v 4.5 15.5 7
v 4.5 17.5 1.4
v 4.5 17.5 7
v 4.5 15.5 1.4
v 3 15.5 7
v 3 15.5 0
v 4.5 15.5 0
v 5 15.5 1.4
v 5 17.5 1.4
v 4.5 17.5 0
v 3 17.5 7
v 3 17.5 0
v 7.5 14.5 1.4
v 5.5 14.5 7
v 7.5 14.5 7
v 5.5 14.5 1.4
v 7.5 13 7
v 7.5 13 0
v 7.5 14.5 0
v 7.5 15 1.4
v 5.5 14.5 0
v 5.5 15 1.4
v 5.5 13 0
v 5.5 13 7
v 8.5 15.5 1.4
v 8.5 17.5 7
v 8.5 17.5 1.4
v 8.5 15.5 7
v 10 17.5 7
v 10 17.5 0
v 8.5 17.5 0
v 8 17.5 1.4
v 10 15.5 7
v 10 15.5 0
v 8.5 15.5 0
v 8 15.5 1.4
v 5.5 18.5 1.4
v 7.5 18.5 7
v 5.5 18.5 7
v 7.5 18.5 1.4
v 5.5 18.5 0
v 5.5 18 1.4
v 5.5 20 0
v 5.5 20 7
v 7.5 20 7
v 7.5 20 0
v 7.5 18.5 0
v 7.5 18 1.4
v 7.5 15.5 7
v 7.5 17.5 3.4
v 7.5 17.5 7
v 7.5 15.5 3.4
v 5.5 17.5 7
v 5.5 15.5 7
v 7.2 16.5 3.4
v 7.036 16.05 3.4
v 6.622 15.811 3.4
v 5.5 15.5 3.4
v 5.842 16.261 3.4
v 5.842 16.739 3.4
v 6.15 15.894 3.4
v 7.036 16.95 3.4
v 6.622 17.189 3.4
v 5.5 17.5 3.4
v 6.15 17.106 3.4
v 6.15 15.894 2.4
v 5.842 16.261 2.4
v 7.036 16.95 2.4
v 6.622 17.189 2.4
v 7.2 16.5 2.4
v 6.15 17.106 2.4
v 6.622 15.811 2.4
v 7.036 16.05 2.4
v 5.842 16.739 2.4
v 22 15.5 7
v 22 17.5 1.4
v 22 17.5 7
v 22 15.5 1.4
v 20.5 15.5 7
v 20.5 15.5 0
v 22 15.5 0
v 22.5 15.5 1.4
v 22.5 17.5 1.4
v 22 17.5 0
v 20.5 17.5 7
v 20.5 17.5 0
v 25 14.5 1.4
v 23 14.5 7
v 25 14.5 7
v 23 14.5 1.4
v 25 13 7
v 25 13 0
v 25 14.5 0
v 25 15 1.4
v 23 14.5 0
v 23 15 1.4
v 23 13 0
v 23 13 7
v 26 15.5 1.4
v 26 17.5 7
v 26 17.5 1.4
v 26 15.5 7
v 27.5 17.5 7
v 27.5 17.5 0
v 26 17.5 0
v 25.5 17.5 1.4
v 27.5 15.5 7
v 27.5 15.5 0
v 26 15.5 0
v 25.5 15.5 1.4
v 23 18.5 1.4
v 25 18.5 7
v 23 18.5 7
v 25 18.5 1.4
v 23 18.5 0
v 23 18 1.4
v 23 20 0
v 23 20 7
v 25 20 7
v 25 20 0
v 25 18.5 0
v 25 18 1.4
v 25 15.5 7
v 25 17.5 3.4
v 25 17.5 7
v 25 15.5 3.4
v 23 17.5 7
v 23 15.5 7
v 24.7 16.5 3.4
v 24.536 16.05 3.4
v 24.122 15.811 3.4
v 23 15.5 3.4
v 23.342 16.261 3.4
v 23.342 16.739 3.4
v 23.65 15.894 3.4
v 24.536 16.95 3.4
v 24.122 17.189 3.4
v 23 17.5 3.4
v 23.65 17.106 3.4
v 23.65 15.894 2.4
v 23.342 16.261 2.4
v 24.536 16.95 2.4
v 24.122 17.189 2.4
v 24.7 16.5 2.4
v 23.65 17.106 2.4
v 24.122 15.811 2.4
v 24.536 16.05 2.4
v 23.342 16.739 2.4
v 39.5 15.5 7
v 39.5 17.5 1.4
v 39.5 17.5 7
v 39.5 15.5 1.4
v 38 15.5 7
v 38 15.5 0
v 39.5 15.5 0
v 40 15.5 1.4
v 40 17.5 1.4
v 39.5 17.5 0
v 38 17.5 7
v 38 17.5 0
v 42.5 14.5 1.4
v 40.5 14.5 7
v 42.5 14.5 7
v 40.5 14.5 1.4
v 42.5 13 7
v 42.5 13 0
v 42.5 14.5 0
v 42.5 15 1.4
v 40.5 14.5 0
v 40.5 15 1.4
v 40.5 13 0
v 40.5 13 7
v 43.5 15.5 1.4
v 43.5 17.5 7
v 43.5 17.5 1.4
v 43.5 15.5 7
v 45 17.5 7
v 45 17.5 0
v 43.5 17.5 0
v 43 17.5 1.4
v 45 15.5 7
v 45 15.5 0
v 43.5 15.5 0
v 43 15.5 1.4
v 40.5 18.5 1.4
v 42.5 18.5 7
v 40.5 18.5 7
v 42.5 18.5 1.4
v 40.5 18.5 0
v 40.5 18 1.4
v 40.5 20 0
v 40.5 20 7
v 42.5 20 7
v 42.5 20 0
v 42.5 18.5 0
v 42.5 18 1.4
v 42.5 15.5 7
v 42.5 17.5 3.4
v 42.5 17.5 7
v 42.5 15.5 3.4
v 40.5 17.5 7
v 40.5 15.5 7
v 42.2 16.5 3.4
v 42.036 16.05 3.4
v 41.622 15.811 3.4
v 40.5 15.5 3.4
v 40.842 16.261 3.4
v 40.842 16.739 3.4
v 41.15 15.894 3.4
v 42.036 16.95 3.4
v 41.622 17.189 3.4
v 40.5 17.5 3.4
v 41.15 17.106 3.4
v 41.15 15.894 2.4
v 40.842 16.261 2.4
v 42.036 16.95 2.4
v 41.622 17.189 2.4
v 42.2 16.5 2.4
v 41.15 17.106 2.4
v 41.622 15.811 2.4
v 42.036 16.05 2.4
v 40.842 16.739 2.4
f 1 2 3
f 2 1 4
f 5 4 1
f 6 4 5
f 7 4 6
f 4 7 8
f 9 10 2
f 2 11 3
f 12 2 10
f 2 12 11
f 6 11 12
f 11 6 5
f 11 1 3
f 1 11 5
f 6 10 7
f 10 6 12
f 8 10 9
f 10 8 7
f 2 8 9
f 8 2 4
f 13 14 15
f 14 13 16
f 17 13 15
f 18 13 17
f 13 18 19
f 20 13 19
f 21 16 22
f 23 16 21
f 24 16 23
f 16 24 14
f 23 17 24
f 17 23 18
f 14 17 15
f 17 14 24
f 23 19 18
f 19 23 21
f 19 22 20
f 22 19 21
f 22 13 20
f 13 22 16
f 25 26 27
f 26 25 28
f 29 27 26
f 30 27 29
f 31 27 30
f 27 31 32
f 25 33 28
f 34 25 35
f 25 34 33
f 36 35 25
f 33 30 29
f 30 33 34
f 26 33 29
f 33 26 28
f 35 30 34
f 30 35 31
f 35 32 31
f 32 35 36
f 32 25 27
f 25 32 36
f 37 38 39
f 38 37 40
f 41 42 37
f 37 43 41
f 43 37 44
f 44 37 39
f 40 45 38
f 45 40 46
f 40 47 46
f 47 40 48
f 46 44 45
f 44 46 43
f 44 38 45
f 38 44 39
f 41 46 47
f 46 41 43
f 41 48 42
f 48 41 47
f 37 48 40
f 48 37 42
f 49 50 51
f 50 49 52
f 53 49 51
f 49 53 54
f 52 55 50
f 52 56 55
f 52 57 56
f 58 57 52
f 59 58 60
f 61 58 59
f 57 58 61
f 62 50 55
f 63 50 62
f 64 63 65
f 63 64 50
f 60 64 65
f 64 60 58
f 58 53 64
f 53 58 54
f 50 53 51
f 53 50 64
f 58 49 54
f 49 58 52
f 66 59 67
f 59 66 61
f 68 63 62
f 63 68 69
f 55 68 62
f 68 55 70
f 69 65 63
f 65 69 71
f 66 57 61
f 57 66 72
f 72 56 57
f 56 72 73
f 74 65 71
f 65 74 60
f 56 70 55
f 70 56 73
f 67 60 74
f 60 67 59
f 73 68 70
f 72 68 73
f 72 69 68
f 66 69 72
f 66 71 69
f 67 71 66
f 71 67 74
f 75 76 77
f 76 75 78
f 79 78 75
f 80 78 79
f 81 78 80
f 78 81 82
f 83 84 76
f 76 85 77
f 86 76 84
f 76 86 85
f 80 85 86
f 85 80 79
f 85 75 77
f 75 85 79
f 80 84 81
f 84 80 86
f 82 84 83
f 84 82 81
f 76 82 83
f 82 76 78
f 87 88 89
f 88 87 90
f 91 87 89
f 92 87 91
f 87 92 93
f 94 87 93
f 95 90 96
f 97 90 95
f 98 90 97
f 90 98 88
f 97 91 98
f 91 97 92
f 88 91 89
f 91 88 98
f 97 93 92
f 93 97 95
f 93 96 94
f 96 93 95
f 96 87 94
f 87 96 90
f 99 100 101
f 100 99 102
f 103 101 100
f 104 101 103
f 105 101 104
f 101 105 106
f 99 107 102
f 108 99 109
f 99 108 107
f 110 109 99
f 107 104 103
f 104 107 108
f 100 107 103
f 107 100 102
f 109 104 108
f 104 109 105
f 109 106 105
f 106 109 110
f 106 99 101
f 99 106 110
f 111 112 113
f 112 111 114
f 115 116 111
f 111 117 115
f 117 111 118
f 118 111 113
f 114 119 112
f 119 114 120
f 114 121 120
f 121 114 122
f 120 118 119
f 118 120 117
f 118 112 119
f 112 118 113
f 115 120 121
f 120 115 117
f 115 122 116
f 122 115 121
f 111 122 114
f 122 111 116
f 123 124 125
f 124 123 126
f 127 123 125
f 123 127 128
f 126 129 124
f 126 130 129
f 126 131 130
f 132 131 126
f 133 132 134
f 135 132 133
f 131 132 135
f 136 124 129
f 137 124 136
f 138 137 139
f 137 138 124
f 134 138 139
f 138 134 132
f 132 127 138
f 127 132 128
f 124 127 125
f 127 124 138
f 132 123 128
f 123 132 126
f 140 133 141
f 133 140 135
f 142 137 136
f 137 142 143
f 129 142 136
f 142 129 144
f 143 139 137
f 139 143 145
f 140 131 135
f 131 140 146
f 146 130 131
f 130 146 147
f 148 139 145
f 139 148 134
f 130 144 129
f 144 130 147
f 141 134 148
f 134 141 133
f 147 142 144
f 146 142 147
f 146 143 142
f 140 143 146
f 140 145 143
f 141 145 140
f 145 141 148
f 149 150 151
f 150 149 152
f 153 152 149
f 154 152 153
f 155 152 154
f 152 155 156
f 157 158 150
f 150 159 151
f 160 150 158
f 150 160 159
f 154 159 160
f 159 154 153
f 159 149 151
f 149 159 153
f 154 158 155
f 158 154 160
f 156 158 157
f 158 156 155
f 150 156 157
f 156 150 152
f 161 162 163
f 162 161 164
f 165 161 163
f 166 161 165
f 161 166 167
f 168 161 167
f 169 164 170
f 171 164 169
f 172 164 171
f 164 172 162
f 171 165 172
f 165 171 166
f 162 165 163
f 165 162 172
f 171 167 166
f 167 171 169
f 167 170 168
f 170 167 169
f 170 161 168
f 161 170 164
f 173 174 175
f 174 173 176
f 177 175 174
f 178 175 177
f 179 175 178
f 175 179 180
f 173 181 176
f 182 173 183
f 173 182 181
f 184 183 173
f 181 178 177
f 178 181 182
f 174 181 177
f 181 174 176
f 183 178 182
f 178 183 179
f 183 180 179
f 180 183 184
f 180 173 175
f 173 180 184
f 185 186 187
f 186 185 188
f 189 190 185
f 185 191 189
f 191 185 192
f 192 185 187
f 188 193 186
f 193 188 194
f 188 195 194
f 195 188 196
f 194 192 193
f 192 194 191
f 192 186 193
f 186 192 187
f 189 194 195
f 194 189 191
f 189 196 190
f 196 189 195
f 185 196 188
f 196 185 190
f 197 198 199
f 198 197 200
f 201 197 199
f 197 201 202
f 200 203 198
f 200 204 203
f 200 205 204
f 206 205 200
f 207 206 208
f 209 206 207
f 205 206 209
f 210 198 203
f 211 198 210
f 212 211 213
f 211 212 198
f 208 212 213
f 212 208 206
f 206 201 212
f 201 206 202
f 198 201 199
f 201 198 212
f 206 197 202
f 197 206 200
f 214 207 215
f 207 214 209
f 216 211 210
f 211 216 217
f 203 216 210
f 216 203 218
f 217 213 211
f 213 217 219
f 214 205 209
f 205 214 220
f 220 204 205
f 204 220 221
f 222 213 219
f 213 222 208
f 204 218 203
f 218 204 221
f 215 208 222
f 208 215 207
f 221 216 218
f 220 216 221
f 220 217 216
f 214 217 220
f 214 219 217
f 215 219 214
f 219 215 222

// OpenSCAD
// file: button_clips.scad
$fs=0.5;

color("darkorange",0.5) button_dock();
color("springgreen") button_clips();
color("red",0.5) button_clip_cavity();

//dock measurements
top_height = 1.8;
shaft_height = 1.4;
dock_height = top_height + shaft_height;
hole_radius = 0.8;
hole_depth = 1;
base_radius = 3.5;
module button_dock(){
	difference(){
		union(){
			translate([-2,-2,shaft_height])
				cube([4,4,top_height]);
			translate([-1.5,-1.5,0])
				cube([3,3,dock_height]);
			translate([0,0,-2])
				cylinder(h=2, r=base_radius);
		}
		translate([0,0,dock_height-hole_depth+0.1]) 
			cylinder(h=hole_depth, r=hole_radius);
	}
}

clip_width = 2;
clip_thick = 1.5;
clip_height = 7;
module button_clip(){
	translate([-(2+clip_thick),clip_width/2,0])
	rotate([90,0,0])
	union(){
		cube([clip_thick ,clip_height, clip_width]);
		linear_extrude(height=clip_width)
		polygon(
			points=[
				[0,0],
				[0,shaft_height],
				[clip_thick+0.5, shaft_height],
				[clip_thick,0]
			],
			paths=[
				[0,1,2,3]
			]
		);
	}
}

module middle_pin(){
	translate([-1,-1,dock_height+0.2]) cube([2,2,clip_height-dock_height-0.2]);
	translate([0,0,dock_height-hole_depth+0.2]) cylinder(h=hole_depth+0.2, r=hole_radius-0.1);
}

module button_clips(){
	rotate([0,0,0]) button_clip();
	rotate([0,0,90]) button_clip();
	rotate([0,0,180]) button_clip();
	rotate([0,0,270]) button_clip();
	middle_pin();
}

module button_clip_cavity(){
	translate([0,0,-1]) cylinder(h=clip_height, r=5);
}
// main file
use <button_clips.scad>;

thumbs();

module thumbs(){
	union(){
		difference(){
			translate([0,0,1]);
			thumb_bodies();
			all_thumb_clip_cavities();
		}
		all_thumb_clips();
	}
}


module thumb_bodies(){
	intersection(){
		linear_extrude(height=10) import("proto_1_thumb_shadows.dxf");
		translate([-5, 18, -20]) rotate([0,90,0]) cylinder(h= 60, r = 30);
	}
}

module all_thumb_clips(){
	translate([6.5,16.5,0]) button_clips();
	translate([6.5+17.5,16.5,0]) button_clips();
	translate([6.5+35,16.5,0]) button_clips();
}

module all_thumb_clip_cavities(){
	translate([6.5,16.5,0]) button_clip_cavity();
	translate([6.5+17.5,16.5,0]) button_clip_cavity();
	translate([6.5+35,16.5,0]) button_clip_cavity();
}
